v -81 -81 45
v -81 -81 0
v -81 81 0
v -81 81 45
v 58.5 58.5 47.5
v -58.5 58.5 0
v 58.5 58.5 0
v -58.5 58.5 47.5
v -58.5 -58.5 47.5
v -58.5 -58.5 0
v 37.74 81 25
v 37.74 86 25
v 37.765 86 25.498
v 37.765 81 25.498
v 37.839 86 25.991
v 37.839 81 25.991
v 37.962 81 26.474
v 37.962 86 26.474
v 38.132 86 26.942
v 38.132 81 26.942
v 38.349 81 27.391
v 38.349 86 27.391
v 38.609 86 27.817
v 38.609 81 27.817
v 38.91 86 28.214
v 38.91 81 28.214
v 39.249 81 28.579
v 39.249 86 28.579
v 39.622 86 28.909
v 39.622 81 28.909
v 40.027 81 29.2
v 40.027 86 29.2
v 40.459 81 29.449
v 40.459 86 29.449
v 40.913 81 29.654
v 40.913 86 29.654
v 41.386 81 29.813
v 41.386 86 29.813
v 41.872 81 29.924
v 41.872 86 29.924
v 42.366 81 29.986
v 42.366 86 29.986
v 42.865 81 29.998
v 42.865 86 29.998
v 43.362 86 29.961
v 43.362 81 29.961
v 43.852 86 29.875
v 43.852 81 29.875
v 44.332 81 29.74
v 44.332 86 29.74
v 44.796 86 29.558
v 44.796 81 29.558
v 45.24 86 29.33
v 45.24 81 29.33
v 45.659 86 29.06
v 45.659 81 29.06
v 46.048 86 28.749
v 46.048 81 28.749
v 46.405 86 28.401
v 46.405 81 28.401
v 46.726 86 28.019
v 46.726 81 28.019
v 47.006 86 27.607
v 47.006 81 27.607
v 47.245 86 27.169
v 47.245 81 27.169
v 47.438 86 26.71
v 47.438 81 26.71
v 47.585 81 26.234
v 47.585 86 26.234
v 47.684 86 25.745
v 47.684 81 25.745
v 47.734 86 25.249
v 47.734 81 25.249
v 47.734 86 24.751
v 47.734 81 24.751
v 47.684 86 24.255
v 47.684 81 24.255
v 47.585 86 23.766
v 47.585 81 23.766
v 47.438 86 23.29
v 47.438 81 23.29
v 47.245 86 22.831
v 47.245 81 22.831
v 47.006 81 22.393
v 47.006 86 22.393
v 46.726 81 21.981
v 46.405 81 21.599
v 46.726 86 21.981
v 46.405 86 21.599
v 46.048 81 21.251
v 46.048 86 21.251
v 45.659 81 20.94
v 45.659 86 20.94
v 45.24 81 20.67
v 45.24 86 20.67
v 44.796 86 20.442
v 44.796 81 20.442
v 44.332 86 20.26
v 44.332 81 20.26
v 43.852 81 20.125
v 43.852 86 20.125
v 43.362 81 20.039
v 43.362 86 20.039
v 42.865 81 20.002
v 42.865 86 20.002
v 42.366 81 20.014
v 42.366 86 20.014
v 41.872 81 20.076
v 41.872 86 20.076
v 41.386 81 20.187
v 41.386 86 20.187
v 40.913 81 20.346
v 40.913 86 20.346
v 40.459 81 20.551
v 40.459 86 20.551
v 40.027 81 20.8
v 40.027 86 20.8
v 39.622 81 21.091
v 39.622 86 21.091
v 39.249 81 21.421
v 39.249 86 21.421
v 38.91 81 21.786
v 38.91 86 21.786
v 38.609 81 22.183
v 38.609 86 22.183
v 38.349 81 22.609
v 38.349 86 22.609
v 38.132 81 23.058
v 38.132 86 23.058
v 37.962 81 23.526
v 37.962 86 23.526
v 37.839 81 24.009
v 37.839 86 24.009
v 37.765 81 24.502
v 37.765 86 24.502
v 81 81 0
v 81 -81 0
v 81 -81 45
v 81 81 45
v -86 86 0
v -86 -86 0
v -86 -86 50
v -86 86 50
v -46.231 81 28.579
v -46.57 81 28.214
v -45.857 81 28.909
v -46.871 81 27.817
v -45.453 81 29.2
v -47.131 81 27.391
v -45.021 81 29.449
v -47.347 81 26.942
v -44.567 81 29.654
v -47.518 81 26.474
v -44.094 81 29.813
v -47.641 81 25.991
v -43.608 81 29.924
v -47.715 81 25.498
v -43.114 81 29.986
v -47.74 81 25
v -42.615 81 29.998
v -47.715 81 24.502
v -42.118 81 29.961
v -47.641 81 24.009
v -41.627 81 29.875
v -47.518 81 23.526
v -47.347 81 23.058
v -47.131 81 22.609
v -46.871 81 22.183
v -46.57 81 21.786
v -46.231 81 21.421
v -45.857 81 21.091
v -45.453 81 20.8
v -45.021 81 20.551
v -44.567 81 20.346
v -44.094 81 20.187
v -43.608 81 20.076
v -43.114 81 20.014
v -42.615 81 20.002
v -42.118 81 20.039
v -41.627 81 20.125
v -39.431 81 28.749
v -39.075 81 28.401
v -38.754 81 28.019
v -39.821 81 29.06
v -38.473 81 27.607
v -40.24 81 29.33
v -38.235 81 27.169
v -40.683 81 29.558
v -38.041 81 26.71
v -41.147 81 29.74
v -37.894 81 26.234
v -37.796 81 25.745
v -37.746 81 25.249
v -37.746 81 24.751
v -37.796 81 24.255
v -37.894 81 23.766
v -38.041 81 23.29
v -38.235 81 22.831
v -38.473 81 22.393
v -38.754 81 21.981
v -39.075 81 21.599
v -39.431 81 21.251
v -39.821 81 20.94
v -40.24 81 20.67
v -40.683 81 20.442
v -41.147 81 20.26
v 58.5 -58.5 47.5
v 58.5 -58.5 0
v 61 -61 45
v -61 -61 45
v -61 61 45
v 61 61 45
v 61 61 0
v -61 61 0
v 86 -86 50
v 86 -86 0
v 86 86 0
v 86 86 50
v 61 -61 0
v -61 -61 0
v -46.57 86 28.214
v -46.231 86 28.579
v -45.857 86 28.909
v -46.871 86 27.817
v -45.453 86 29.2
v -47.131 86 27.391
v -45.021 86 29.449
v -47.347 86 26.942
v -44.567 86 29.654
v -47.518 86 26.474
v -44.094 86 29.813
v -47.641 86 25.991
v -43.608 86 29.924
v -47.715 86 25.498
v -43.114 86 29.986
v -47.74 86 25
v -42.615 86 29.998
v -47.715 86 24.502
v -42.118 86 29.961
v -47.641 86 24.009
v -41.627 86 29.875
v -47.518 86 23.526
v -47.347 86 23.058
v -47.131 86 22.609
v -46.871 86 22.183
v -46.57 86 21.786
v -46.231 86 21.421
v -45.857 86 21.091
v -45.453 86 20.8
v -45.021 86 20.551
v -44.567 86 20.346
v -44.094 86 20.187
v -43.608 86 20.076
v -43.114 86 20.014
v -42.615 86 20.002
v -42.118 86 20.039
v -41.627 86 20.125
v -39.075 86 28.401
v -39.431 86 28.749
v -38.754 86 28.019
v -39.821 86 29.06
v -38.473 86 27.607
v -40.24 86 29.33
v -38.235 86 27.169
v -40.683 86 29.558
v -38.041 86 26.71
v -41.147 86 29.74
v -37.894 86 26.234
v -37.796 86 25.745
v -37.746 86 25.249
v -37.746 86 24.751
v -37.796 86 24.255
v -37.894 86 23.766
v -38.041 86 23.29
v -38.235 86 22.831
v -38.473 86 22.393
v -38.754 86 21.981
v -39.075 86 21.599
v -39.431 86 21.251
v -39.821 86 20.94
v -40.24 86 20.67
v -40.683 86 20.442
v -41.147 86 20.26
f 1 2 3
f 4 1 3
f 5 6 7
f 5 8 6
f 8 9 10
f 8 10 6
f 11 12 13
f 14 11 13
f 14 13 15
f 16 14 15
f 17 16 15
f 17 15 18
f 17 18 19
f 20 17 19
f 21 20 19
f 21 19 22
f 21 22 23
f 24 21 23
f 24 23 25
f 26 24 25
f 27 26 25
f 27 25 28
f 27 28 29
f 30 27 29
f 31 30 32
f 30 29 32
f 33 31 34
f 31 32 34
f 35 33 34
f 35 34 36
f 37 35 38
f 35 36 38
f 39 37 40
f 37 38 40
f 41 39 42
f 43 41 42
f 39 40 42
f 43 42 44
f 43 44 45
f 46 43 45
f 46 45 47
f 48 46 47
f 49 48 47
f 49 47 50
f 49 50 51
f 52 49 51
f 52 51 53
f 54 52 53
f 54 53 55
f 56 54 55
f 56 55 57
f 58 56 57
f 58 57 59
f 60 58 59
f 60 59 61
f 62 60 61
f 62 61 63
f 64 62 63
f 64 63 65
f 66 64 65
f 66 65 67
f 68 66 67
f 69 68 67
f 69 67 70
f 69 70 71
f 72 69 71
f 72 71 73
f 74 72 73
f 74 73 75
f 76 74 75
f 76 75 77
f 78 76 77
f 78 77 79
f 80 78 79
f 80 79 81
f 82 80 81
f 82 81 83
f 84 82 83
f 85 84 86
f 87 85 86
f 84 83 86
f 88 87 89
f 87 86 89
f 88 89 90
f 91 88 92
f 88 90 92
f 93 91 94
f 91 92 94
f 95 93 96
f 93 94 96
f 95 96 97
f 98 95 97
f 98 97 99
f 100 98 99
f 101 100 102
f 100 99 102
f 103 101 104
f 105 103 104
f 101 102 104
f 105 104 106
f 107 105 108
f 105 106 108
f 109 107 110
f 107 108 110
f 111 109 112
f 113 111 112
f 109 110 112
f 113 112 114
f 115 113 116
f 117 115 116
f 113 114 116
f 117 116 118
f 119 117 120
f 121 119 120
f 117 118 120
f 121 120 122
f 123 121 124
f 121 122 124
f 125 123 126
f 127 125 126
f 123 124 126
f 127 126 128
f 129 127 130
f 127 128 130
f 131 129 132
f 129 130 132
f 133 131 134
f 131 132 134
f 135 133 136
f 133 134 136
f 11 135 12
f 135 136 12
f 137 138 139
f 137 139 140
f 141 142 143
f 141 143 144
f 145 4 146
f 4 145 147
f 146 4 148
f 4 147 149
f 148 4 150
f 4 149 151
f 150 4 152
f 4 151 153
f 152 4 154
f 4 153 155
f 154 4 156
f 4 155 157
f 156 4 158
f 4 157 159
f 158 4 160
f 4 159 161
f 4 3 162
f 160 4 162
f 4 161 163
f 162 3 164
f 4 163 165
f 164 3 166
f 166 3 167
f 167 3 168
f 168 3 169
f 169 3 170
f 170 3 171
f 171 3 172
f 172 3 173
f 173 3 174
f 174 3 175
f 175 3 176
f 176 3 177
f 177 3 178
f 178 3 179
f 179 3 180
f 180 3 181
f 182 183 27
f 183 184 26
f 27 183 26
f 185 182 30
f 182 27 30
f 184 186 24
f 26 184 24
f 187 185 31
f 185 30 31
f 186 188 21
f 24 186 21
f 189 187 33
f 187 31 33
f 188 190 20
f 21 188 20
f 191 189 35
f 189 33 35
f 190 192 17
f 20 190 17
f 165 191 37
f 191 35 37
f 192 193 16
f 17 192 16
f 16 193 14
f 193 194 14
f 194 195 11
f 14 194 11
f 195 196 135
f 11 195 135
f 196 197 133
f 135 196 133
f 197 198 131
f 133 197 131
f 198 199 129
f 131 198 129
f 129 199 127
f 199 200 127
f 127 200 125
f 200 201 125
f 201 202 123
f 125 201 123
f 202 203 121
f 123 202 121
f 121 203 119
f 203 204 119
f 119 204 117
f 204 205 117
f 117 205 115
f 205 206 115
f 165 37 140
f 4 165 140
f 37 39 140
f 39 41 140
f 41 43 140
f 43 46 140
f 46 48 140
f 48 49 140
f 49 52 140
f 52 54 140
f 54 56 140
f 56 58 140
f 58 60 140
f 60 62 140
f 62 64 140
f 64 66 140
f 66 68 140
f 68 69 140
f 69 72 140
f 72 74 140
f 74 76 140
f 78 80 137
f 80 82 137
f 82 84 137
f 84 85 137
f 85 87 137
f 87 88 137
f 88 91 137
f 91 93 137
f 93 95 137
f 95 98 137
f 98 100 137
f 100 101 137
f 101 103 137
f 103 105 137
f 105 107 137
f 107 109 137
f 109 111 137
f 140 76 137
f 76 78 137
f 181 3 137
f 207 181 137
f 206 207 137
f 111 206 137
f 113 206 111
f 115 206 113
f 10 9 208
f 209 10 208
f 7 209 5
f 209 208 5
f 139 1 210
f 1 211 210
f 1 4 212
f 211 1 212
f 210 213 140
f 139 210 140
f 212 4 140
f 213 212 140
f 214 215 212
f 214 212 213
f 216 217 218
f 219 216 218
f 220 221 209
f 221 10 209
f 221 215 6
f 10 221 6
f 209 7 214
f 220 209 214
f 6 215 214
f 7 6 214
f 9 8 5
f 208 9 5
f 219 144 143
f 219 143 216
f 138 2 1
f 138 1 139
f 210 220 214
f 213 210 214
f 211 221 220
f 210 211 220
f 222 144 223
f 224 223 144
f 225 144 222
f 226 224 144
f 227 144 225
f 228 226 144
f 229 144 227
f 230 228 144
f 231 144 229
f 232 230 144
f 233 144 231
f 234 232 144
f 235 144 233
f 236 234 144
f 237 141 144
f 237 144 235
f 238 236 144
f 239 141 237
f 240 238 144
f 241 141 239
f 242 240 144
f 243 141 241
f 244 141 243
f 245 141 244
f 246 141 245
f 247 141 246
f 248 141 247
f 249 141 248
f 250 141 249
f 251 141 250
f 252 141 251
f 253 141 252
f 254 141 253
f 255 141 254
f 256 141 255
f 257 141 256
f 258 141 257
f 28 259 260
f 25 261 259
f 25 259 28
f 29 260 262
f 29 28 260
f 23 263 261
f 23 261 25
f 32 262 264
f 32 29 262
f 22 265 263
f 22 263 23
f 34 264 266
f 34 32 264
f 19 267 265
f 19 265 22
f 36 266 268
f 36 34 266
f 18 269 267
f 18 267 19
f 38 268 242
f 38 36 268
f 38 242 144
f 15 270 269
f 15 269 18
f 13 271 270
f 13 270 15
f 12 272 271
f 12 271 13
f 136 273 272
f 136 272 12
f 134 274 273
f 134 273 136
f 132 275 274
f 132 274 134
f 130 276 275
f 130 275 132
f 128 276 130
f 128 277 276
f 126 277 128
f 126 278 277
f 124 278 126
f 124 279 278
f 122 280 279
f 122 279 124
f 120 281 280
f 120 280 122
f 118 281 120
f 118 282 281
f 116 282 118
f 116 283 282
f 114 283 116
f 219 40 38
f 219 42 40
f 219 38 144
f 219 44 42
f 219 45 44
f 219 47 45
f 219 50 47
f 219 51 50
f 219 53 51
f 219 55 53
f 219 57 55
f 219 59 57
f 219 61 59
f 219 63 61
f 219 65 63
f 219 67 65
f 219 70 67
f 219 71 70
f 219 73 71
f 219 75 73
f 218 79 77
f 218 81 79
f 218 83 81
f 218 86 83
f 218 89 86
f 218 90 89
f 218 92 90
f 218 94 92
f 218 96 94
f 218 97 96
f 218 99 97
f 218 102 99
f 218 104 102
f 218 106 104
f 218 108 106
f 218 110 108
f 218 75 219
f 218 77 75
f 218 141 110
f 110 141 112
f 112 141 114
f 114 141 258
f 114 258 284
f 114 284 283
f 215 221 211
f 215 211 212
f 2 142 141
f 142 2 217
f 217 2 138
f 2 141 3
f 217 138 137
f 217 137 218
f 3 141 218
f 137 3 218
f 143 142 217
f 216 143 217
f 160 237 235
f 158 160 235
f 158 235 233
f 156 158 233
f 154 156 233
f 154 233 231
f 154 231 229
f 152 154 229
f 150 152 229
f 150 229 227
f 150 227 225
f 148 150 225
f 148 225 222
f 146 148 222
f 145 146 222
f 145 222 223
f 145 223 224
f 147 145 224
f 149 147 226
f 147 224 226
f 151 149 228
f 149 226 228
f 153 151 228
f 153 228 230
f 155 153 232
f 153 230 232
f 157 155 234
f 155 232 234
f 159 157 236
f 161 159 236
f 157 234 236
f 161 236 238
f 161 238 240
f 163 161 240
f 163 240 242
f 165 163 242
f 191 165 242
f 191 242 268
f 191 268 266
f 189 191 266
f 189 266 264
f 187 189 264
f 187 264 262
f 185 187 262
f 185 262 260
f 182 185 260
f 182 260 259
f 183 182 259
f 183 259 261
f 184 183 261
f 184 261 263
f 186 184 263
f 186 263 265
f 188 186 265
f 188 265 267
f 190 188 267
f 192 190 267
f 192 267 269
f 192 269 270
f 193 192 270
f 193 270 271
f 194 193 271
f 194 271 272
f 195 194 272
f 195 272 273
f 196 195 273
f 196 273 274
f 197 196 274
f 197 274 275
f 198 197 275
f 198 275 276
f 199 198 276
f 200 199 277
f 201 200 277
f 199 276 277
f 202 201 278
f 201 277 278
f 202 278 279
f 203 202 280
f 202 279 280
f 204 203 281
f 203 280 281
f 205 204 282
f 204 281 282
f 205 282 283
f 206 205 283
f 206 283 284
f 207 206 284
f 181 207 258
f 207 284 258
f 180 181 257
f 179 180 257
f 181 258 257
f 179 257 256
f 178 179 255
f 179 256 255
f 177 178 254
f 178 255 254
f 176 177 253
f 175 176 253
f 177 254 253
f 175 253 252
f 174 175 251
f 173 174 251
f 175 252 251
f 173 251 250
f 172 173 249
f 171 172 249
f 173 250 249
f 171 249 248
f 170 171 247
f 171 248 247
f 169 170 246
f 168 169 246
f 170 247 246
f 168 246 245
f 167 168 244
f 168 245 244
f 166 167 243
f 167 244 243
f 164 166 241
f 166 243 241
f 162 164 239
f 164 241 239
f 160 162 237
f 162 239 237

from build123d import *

# Parameters (mm, degrees)
F0_W     = 172
F0_H     = 172
F1_DEPTH = 50
F2_W     = 162
F2_H     = 162
F2_W_2   = 122
F2_H_2   = 122
F3_DEPTH = 45
F4_T     = -2.5
F5_R     = 5
F6_DEPTH = 9.5


# Not quite as in the source:
# - a shell that OpenCascade refuses in one call is made with other operations: the cavity is built on its own and cut out


with BuildPart() as f1:
    # F0 (on Top) → F1 (new body)
    with BuildSketch(Plane.XY):
        Rectangle(F0_W, F0_H)
    extrude(amount=F1_DEPTH)

    # F2 (on Top) → F3 (cut)
    with BuildSketch(Plane.XY):
        Rectangle(F2_W, F2_H)
        Rectangle(F2_W_2, F2_H_2, mode=Mode.SUBTRACT)
    extrude(amount=F3_DEPTH, mode=Mode.SUBTRACT)

    # F4: a shell. OpenCascade refuses it in one call, so the cavity is built on its own and cut out:
    # the body offset inwards by the wall thickness, plus a prism from it out through each open face.
    f4_core = offset(f1.part, amount=F4_T, kind=Kind.INTERSECTION, mode=Mode.PRIVATE)
    f4_exits = [f4_core.faces().sort_by_distance(p)[0] for p in [
        (0, 0, 2.5),
    ]]
    add(f4_core, mode=Mode.SUBTRACT)
    extrude(f4_exits, amount=-F4_T, mode=Mode.SUBTRACT)

    # F5 (on face) → F6 (cut)
    with BuildSketch(Plane(origin=(0, 86, 0), x_dir=(-1, 0, 0), z_dir=(0, 1, 0))):
        with Locations((42.7398793399, 25)):
            Circle(F5_R)
        with Locations((-42.7398793399, 25)):
            Circle(F5_R)
    extrude(amount=-F6_DEPTH, mode=Mode.SUBTRACT)


solid = f1.part
